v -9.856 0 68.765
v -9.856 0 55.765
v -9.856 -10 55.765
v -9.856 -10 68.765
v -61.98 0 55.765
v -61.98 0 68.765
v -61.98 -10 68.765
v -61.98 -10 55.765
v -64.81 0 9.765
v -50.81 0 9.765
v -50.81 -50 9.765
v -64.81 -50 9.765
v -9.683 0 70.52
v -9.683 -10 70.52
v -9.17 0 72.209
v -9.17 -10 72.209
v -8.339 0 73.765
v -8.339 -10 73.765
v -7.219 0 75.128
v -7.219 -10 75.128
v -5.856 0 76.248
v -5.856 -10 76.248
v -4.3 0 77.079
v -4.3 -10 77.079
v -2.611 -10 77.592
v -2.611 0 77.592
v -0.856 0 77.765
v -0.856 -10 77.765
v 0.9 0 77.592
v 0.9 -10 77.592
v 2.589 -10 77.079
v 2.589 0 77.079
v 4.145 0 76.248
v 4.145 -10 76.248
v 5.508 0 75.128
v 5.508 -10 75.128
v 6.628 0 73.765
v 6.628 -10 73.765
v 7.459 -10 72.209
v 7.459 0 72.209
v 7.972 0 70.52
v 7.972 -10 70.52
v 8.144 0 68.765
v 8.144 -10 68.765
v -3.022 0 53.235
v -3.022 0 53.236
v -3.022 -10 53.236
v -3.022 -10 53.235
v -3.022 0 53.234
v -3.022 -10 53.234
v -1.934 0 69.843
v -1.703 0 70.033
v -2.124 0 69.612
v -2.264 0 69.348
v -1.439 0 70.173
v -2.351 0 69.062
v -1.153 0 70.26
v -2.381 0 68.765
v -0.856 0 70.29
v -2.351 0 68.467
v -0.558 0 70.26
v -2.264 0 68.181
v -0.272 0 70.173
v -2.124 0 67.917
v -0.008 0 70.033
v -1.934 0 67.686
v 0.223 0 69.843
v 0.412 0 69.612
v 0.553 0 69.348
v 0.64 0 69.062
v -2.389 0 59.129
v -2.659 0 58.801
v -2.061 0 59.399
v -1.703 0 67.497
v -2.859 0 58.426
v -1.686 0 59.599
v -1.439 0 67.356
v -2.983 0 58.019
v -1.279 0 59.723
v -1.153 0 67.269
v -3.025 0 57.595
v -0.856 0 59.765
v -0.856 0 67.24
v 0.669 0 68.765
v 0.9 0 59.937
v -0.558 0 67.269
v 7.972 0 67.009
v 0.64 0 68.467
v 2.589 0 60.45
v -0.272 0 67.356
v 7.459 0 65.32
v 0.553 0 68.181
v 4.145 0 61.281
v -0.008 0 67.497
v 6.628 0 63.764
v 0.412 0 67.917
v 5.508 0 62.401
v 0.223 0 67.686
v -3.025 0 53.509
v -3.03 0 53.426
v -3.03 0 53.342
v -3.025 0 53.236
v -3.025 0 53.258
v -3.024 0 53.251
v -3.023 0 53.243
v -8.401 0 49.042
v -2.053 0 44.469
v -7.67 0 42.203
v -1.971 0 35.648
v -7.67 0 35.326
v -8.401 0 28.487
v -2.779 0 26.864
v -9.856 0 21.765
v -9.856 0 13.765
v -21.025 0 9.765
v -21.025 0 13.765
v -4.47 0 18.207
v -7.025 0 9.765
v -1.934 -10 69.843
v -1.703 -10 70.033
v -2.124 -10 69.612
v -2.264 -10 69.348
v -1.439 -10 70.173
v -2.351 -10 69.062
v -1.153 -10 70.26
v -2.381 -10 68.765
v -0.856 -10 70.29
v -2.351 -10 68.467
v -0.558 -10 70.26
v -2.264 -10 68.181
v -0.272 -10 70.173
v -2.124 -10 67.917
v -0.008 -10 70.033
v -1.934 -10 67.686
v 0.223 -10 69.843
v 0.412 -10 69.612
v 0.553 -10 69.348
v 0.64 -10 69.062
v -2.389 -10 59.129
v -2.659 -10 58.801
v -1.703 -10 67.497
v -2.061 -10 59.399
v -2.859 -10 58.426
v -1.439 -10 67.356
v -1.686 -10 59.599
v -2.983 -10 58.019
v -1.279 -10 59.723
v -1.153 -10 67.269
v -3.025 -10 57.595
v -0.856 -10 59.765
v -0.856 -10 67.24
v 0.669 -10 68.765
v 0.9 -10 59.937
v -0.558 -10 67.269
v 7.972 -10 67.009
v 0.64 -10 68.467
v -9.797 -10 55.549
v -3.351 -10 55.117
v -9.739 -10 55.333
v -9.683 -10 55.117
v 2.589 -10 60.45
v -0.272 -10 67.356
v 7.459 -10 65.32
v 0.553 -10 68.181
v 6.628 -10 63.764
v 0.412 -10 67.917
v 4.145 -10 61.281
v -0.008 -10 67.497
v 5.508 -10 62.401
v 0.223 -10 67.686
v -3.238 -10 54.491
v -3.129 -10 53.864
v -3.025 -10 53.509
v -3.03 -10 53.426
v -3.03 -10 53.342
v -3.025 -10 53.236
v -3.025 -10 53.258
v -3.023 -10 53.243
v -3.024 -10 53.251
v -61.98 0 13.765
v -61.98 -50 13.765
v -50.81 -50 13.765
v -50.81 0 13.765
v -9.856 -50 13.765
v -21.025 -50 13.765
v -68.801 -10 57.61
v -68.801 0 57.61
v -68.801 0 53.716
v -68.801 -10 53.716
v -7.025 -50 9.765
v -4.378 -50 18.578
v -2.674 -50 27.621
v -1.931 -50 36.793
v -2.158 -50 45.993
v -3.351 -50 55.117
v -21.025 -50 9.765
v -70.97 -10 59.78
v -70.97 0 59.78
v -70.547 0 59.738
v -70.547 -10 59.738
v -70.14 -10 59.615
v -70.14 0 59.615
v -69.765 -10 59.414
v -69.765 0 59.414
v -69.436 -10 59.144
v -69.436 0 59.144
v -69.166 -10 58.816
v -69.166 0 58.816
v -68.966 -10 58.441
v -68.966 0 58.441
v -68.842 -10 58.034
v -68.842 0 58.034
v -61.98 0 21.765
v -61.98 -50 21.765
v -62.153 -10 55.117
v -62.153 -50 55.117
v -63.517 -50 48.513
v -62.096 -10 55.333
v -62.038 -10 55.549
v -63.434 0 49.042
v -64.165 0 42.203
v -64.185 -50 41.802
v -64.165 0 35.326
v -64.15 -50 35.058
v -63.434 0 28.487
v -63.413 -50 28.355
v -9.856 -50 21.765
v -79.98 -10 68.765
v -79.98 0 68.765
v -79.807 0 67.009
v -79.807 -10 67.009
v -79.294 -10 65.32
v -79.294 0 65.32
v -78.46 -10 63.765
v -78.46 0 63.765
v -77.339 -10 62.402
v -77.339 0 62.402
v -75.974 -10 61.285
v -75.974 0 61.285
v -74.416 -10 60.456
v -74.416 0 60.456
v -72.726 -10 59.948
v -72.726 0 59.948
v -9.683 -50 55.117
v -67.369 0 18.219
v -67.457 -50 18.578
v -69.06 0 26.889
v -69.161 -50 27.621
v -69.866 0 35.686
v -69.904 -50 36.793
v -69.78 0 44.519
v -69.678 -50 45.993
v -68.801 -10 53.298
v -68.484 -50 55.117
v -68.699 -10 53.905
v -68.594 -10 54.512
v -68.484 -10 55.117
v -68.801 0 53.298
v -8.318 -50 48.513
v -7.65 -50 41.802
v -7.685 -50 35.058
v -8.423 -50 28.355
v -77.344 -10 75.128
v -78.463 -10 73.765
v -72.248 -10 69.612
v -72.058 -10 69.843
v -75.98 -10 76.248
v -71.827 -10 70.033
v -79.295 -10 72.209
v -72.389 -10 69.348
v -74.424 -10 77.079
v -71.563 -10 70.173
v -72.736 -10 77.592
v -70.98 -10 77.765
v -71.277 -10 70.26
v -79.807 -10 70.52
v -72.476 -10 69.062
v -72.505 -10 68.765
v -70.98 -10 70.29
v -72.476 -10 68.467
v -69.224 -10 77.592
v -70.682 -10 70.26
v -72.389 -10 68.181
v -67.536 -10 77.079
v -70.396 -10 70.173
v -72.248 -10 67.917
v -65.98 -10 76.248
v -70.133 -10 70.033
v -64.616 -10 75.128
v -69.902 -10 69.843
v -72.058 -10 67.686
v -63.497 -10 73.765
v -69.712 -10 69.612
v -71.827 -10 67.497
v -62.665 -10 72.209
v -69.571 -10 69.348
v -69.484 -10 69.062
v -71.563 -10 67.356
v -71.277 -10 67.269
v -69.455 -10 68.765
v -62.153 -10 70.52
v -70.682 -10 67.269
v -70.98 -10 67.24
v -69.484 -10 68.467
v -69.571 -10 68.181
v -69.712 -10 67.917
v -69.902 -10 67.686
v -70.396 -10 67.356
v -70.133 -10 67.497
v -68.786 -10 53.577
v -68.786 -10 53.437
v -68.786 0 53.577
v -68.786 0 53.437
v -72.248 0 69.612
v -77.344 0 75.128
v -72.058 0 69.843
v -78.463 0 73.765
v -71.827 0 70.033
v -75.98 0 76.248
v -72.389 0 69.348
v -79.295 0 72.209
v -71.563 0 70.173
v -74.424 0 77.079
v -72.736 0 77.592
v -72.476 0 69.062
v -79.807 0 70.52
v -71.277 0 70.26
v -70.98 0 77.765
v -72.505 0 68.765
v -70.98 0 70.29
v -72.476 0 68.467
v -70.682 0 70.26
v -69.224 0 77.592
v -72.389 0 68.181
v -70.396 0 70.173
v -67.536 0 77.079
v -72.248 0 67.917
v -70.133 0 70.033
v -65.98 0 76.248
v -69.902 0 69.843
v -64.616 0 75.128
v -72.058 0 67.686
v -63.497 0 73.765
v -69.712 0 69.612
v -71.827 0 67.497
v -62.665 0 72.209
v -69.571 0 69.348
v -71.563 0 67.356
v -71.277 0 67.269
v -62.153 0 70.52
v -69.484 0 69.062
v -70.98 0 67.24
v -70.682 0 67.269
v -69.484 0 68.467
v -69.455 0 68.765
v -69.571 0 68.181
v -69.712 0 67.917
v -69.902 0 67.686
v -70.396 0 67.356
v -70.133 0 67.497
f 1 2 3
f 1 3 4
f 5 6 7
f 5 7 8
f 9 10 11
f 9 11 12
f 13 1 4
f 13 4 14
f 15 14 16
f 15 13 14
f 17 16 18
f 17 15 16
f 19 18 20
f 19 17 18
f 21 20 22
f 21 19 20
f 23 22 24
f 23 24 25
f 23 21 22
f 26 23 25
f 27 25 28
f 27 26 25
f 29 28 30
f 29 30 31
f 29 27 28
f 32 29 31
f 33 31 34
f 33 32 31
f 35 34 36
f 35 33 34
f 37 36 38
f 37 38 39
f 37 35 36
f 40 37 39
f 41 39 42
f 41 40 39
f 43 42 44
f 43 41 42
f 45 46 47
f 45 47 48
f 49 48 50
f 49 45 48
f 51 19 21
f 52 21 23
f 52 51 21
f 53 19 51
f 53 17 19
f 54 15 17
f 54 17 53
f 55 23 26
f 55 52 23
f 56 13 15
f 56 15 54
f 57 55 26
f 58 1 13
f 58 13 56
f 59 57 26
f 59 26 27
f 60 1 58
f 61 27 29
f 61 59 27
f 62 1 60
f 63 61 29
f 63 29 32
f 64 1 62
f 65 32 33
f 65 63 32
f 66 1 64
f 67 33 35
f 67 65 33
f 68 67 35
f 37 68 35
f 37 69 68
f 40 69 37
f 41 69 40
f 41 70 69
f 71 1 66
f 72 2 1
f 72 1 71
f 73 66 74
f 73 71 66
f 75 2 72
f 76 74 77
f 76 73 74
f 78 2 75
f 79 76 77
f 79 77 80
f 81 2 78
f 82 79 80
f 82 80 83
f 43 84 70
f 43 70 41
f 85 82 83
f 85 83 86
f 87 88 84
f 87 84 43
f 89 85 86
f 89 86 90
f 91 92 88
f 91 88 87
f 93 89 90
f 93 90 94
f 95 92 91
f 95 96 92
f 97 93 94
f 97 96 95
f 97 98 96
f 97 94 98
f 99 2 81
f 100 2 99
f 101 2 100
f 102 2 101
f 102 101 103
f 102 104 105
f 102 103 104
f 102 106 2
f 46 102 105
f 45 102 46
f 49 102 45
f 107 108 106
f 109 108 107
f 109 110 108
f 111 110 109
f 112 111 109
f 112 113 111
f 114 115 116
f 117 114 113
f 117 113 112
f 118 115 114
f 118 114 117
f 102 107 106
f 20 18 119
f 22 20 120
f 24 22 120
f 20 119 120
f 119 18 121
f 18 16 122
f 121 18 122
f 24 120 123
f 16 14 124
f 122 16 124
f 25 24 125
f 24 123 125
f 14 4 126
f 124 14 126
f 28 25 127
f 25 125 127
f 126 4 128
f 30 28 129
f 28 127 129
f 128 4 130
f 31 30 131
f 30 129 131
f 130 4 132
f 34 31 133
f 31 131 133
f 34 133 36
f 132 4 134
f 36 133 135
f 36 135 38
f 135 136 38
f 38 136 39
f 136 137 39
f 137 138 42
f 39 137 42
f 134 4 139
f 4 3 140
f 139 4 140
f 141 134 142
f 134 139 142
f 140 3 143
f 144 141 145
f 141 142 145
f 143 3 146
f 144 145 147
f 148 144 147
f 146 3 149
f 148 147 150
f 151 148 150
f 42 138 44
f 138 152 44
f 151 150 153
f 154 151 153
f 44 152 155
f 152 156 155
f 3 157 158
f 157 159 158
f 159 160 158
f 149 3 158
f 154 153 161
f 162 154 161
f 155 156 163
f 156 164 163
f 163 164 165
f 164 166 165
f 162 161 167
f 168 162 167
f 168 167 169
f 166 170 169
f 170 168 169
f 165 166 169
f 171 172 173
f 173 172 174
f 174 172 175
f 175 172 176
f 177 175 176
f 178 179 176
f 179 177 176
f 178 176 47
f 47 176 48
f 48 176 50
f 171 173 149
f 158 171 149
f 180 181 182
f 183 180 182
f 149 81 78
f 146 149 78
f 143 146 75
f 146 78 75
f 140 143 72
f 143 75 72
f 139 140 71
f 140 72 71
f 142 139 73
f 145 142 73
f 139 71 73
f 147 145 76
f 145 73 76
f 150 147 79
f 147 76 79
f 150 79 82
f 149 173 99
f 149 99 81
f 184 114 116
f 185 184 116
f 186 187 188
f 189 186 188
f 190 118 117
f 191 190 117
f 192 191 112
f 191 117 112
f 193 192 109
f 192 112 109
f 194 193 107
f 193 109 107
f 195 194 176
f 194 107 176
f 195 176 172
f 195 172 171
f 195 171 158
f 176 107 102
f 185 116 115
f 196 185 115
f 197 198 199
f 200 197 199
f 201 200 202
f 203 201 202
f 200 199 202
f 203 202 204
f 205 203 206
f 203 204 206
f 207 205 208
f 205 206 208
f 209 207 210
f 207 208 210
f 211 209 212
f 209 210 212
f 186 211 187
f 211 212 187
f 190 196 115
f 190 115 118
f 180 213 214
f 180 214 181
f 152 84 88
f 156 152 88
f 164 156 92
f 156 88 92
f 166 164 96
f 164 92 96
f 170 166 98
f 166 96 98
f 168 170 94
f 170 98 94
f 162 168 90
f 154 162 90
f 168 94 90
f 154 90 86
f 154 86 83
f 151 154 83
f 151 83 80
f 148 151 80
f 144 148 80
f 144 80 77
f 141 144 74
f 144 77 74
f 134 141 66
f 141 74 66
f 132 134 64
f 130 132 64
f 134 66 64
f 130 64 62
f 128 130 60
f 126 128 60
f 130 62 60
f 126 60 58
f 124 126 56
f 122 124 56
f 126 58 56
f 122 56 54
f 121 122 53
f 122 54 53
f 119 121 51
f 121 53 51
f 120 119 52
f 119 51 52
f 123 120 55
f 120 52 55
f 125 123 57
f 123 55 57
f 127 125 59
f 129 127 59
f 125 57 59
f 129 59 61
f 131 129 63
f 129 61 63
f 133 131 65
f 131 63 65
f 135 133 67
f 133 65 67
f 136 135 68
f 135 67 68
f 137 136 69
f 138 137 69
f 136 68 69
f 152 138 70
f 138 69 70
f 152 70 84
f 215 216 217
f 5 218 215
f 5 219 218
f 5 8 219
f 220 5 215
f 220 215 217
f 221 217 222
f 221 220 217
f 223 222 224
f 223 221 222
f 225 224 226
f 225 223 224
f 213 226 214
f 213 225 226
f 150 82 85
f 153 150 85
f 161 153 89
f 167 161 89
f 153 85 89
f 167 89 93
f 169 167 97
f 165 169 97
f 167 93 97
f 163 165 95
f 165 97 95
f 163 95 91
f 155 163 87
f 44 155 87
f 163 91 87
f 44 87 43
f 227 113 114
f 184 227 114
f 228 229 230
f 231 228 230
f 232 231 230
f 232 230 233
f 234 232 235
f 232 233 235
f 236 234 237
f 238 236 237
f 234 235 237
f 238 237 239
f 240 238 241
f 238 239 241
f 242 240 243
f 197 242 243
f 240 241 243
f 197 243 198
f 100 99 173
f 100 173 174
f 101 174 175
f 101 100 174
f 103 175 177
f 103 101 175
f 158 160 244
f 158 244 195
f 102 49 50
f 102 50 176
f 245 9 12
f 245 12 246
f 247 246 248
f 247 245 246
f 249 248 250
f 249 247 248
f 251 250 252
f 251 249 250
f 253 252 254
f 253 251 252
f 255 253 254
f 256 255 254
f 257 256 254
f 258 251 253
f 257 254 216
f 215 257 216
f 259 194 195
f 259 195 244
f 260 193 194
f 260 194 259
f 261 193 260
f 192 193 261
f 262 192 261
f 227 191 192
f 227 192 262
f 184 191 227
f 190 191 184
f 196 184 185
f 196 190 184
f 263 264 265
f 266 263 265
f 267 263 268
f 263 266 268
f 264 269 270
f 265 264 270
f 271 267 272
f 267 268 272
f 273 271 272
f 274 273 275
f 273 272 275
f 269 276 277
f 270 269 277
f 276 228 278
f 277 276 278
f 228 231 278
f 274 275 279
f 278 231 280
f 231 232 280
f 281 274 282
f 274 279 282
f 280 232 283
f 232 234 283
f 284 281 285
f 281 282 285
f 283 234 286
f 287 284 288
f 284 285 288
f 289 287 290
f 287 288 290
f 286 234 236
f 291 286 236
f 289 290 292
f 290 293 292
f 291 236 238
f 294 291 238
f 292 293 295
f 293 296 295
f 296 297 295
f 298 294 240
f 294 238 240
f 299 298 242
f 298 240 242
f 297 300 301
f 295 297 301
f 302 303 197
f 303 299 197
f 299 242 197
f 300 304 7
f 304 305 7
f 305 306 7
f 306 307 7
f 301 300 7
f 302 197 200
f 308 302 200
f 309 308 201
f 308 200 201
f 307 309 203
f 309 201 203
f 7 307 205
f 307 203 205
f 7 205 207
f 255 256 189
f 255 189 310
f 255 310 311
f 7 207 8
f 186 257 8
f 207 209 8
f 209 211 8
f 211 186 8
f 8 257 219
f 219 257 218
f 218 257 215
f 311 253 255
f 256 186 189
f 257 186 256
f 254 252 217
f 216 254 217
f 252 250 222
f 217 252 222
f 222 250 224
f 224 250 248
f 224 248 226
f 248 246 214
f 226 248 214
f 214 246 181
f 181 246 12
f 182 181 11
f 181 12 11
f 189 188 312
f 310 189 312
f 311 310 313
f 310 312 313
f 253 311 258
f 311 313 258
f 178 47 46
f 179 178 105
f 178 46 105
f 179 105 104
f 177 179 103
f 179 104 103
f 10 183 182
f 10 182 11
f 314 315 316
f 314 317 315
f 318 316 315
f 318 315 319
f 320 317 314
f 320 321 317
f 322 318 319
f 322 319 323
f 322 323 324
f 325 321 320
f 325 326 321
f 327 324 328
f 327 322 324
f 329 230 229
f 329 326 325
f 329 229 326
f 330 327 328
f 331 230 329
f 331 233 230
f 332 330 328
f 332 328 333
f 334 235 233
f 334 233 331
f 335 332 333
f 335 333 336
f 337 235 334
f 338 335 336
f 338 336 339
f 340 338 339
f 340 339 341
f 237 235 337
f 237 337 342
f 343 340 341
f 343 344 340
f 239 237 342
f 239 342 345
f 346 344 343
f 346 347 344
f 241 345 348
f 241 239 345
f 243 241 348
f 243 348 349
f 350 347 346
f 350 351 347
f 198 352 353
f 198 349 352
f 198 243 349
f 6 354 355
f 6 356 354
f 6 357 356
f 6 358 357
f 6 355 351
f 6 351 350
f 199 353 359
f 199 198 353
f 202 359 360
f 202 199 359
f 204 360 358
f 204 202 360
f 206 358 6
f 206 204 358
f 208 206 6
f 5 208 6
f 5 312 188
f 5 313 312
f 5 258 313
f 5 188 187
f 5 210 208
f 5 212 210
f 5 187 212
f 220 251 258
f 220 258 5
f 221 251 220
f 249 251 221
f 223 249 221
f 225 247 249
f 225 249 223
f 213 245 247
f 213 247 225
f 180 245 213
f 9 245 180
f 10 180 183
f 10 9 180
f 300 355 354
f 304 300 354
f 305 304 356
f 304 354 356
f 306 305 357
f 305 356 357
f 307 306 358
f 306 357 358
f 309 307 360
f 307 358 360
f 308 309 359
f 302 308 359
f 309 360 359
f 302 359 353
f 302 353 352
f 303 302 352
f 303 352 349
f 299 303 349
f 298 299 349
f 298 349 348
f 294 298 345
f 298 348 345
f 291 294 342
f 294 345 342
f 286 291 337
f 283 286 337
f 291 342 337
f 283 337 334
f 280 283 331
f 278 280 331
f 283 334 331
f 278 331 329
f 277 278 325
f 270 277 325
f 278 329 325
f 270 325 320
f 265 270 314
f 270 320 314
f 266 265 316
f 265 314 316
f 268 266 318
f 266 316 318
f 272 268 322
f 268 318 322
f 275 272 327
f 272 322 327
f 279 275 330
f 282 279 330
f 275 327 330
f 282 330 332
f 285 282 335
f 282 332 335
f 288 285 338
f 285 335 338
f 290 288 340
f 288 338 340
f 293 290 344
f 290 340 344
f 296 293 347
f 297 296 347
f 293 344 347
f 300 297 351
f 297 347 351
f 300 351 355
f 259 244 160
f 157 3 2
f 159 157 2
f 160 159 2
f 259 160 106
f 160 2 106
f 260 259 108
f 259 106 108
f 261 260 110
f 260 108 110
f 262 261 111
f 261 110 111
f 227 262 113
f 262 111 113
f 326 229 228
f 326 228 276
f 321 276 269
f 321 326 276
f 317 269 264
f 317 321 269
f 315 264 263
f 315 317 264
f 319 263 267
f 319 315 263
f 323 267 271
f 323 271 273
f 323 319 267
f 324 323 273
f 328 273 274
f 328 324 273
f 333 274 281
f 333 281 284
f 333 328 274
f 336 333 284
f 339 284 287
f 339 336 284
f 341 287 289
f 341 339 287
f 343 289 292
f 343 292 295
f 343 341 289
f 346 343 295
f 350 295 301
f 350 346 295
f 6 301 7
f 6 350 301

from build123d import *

# Parameters (mm, degrees)
BOSS_EXTRUDE1_DEPTH   = 50
BOSS_EXTRUDE1_2_DEPTH = 50
SKETCH2_R             = 9
CUT_EXTRUDE1_DEPTH    = 40
CUT_EXTRUDE2_DEPTH    = 40
BOSS_EXTRUDE2_DEPTH   = 10
SKETCH5_R             = 1.525
CUT_EXTRUDE3_DEPTH    = 10
BOSS_EXTRUDE3_DEPTH   = 10
SKETCH8_R             = 1.525
BOSS_EXTRUDE4_DEPTH   = 10
CUT_EXTRUDE5_DEPTH    = 10
SKETCH10_R            = 1.525
CUT_EXTRUDE6_DEPTH    = 10


with BuildPart() as part:
    # Sketch1 → Boss-Extrude1 (new body)
    with BuildSketch(Plane(origin=(0, 0, 0), x_dir=(1, 0, 0), z_dir=(0, 1, 0))):
        with BuildLine():
            Line((-9.855511121, -63.764528812), (-9.855511121, -55.764528812))
            ThreePointArc((-9.855511121, -55.764528812), (-7.578540573, -38.764528812), (-9.855511121, -21.764528812))
            Line((-9.855511121, -21.764528812), (-9.855511121, -13.764528812))
            Line((-9.855511121, -13.764528812), (-21.025316782, -13.764528812))
            Line((-21.025316782, -13.764528812), (-21.025316782, -9.764528812))
            Line((-21.025316782, -9.764528812), (-7.025316782, -9.764528812))
            ThreePointArc((-7.025316782, -9.764528812), (-2.18156011, -32.197425329), (-3.351205363, -55.117476699))
            ThreePointArc((-3.351205363, -55.117476699), (6.336889319, -69.174646732), (-9.855511121, -63.764528812))
        make_face()
    extrude(amount=-BOSS_EXTRUDE1_DEPTH)


with BuildPart() as body_2:
    # Sketch1 → Boss-Extrude1 2 (new body)
    with BuildSketch(Plane(origin=(0, 0, 0), x_dir=(1, 0, 0), z_dir=(0, 1, 0))):
        with BuildLine():
            Line((-50.810057702, -9.764528812), (-64.810057702, -9.764528812))
            ThreePointArc((-64.810057702, -9.764528812), (-69.653814374, -32.197425329), (-68.484169121, -55.117476699))
            ThreePointArc((-68.484169121, -55.117476699), (-78.172263802, -69.174646732), (-61.979863362, -63.764528812))
            Line((-61.979863362, -63.764528812), (-61.979863362, -55.764528812))
            ThreePointArc((-61.979863362, -55.764528812), (-64.256833911, -38.764528812), (-61.979863362, -21.764528812))
            Line((-61.979863362, -21.764528812), (-61.979863362, -13.764528812))
            Line((-61.979863362, -13.764528812), (-50.810057702, -13.764528812))
            Line((-50.810057702, -13.764528812), (-50.810057702, -9.764528812))
        make_face()
    extrude(amount=-BOSS_EXTRUDE1_2_DEPTH)


with BuildPart() as cut_extrude1_tool:
    # Sketch2 → Cut-Extrude1 (new body)
    with BuildSketch(Plane.XZ.offset(50)):
        with Locations((-70.979863362, 63.764528812)):
            Circle(SKETCH2_R)
        with Locations((-0.855511121, 63.764528812)):
            Circle(SKETCH2_R)
    extrude(amount=-CUT_EXTRUDE1_DEPTH)


with BuildPart() as part_1:
    add(part.part)

    # Cut-Extrude1: cut by cut_extrude1_tool
    add(cut_extrude1_tool.part, mode=Mode.SUBTRACT)


with BuildPart() as body_2_1:
    add(body_2.part)

    # Cut-Extrude1: cut by cut_extrude1_tool
    add(cut_extrude1_tool.part, mode=Mode.SUBTRACT)


with BuildPart() as cut_extrude2_tool:
    # Sketch3 → Cut-Extrude2 (new body)
    with BuildSketch(Plane.XZ.offset(50)):
        Polygon((-68.484169121, 55.117476699), (-62.152762542, 55.117476699), (-3.351205363, 55.117476699), (-3.351205363, 65.102133375), (-68.484169121, 65.102133375), align=None)
    extrude(amount=-CUT_EXTRUDE2_DEPTH)


with BuildPart() as part_2:
    add(part_1.part)

    # Cut-Extrude2: cut by cut_extrude2_tool
    add(cut_extrude2_tool.part, mode=Mode.SUBTRACT)



with BuildPart() as body_2_2:
    add(body_2_1.part)

    # Cut-Extrude2: cut by cut_extrude2_tool
    add(cut_extrude2_tool.part, mode=Mode.SUBTRACT)


with BuildPart() as part_3:
    add(part_2.part)

    add(body_2_2.part)  # Boss-Extrude2 merges body 2
    # Sketch4 → Boss-Extrude2 (add)
    with BuildSketch(Plane(origin=(0, 0, 0), x_dir=(1, 0, 0), z_dir=(0, 1, 0))):
        with BuildLine():
            Line((-68.80061851, -53.298361428), (-66.667189119, -54.389414211))
            Line((-66.667189119, -54.389414211), (-69.130149729, -56.574087603))
            Line((-69.130149729, -56.574087603), (-70.193770041, -54.798924689))
            ThreePointArc((-70.193770041, -54.798924689), (-69.130149729, -54.389414211), (-68.80061851, -53.298361428))
        make_face()
        with BuildLine():
            Line((-3.022233862, -53.234325611), (-4.829856794, -54.317394917))
            Line((-4.829856794, -54.317394917), (-2.828145338, -56.574087603))
            Line((-2.828145338, -56.574087603), (-1.517471846, -54.788905825))
            ThreePointArc((-1.517471846, -54.788905825), (-2.633556106, -54.363663707), (-3.022233862, -53.234325611))
        make_face()
    extrude(amount=-BOSS_EXTRUDE2_DEPTH)

    # Sketch5 → Cut-Extrude3 (cut)
    with BuildSketch(Plane(origin=(0, 0, 0), x_dir=(1, 0, 0), z_dir=(0, 1, 0))):
        with Locations((-70.979863362, -63.764528812)):
            Circle(SKETCH5_R)
        with Locations((-0.855511121, -63.764528812)):
            Circle(SKETCH5_R)
    extrude(amount=-CUT_EXTRUDE3_DEPTH, mode=Mode.SUBTRACT)

    # Sketch7 → Boss-Extrude3 (add)
    with BuildSketch(Plane(origin=(0, 0, 0), x_dir=(1, 0, 0), z_dir=(0, 1, 0))):
        with BuildLine():
            Line((-9.855511121, -63.764528812), (-9.855511121, -68.764528812))
            ThreePointArc((-9.855511121, -68.764528812), (-0.855511121, -77.764528812), (8.144488879, -68.764528812))
            Line((8.144488879, -68.764528812), (8.144488879, -63.764528812))
            ThreePointArc((8.144488879, -63.764528812), (-0.855511121, -72.764528812), (-9.855511121, -63.764528812))
        make_face()
        with BuildLine():
            Line((-61.979863362, -68.764528812), (-61.979863362, -63.764528812))
            ThreePointArc((-61.979863362, -63.764528812), (-70.979863362, -72.764528812), (-79.979863362, -63.764528812))
            Line((-79.979863362, -63.764528812), (-79.979863362, -68.764528812))
            ThreePointArc((-79.979863362, -68.764528812), (-70.979863362, -77.764528812), (-61.979863362, -68.764528812))
        make_face()
    extrude(amount=-BOSS_EXTRUDE3_DEPTH)

    # Sketch8 → Boss-Extrude4 (add)
    with BuildSketch(Plane(origin=(0, 0, 0), x_dir=(1, 0, 0), z_dir=(0, 1, 0))):
        with Locations((-70.979863362, -63.764528812)):
            Circle(SKETCH8_R)
        with Locations((-0.855511121, -63.764528812)):
            Circle(SKETCH8_R)
    extrude(amount=-BOSS_EXTRUDE4_DEPTH)

    # Sketch9 → Cut-Extrude5 (cut)
    with BuildSketch(Plane(origin=(0, 0, 0), x_dir=(1, 0, 0), z_dir=(0, 1, 0))):
        with BuildLine():
            Line((-68.80061851, -57.610412769), (-68.80061851, -53.298361428))
            Line((-68.80061851, -53.298361428), (-79.979863362, -53.298361428))
            Line((-79.979863362, -53.298361428), (-79.979863362, -68.764528812))
            ThreePointArc((-79.979863362, -68.764528812), (-77.33935677, -62.402350031), (-70.969828212, -59.779622471))
            ThreePointArc((-70.969828212, -59.779622471), (-69.435965322, -59.144275659), (-68.80061851, -57.610412769))
        make_face()
        with BuildLine():
            Line((-3.024563926, -53.509227684), (-3.024563926, -57.595476008))
            ThreePointArc((-3.024563926, -57.595476008), (-2.389263068, -59.129227954), (-0.855511121, -59.764528812))
            ThreePointArc((-0.855511121, -59.764528812), (5.508449909, -62.400567781), (8.144488879, -68.764528812))
            Line((8.144488879, -68.764528812), (8.144488879, -63.764528812))
            ThreePointArc((8.144488879, -63.764528812), (5.269942065, -57.170681433), (-1.517471846, -54.788905825))
            ThreePointArc((-1.517471846, -54.788905825), (-2.533126576, -54.457755259), (-3.024563926, -53.509227684))
        make_face()
        with BuildLine():
            Line((-3.024563926, -53.258097146), (-3.024563926, -53.509227684))
            ThreePointArc((-3.024563926, -53.509227684), (-2.533126576, -54.457755259), (-1.517471846, -54.788905825))
            ThreePointArc((-1.517471846, -54.788905825), (5.269942065, -57.170681433), (8.144488879, -63.764528812))
            Line((8.144488879, -63.764528812), (8.144488879, -53.235721709))
            Line((8.144488879, -53.235721709), (-3.02238196, -53.235721709))
            ThreePointArc((-3.02238196, -53.235721709), (-3.023517569, -53.246905076), (-3.024563926, -53.258097146))
        make_face()
    extrude(amount=-CUT_EXTRUDE5_DEPTH, mode=Mode.SUBTRACT)

    # Sketch10 → Cut-Extrude6 (cut)
    with BuildSketch(Plane(origin=(0, 0, 0), x_dir=(1, 0, 0), z_dir=(0, 1, 0))):
        with Locations((-70.979863362, -68.764528812)):
            Circle(SKETCH10_R)
        with Locations((-0.855511121, -68.764528812)):
            Circle(SKETCH10_R)
    extrude(amount=-CUT_EXTRUDE6_DEPTH, mode=Mode.SUBTRACT)


solid = part_3.part
